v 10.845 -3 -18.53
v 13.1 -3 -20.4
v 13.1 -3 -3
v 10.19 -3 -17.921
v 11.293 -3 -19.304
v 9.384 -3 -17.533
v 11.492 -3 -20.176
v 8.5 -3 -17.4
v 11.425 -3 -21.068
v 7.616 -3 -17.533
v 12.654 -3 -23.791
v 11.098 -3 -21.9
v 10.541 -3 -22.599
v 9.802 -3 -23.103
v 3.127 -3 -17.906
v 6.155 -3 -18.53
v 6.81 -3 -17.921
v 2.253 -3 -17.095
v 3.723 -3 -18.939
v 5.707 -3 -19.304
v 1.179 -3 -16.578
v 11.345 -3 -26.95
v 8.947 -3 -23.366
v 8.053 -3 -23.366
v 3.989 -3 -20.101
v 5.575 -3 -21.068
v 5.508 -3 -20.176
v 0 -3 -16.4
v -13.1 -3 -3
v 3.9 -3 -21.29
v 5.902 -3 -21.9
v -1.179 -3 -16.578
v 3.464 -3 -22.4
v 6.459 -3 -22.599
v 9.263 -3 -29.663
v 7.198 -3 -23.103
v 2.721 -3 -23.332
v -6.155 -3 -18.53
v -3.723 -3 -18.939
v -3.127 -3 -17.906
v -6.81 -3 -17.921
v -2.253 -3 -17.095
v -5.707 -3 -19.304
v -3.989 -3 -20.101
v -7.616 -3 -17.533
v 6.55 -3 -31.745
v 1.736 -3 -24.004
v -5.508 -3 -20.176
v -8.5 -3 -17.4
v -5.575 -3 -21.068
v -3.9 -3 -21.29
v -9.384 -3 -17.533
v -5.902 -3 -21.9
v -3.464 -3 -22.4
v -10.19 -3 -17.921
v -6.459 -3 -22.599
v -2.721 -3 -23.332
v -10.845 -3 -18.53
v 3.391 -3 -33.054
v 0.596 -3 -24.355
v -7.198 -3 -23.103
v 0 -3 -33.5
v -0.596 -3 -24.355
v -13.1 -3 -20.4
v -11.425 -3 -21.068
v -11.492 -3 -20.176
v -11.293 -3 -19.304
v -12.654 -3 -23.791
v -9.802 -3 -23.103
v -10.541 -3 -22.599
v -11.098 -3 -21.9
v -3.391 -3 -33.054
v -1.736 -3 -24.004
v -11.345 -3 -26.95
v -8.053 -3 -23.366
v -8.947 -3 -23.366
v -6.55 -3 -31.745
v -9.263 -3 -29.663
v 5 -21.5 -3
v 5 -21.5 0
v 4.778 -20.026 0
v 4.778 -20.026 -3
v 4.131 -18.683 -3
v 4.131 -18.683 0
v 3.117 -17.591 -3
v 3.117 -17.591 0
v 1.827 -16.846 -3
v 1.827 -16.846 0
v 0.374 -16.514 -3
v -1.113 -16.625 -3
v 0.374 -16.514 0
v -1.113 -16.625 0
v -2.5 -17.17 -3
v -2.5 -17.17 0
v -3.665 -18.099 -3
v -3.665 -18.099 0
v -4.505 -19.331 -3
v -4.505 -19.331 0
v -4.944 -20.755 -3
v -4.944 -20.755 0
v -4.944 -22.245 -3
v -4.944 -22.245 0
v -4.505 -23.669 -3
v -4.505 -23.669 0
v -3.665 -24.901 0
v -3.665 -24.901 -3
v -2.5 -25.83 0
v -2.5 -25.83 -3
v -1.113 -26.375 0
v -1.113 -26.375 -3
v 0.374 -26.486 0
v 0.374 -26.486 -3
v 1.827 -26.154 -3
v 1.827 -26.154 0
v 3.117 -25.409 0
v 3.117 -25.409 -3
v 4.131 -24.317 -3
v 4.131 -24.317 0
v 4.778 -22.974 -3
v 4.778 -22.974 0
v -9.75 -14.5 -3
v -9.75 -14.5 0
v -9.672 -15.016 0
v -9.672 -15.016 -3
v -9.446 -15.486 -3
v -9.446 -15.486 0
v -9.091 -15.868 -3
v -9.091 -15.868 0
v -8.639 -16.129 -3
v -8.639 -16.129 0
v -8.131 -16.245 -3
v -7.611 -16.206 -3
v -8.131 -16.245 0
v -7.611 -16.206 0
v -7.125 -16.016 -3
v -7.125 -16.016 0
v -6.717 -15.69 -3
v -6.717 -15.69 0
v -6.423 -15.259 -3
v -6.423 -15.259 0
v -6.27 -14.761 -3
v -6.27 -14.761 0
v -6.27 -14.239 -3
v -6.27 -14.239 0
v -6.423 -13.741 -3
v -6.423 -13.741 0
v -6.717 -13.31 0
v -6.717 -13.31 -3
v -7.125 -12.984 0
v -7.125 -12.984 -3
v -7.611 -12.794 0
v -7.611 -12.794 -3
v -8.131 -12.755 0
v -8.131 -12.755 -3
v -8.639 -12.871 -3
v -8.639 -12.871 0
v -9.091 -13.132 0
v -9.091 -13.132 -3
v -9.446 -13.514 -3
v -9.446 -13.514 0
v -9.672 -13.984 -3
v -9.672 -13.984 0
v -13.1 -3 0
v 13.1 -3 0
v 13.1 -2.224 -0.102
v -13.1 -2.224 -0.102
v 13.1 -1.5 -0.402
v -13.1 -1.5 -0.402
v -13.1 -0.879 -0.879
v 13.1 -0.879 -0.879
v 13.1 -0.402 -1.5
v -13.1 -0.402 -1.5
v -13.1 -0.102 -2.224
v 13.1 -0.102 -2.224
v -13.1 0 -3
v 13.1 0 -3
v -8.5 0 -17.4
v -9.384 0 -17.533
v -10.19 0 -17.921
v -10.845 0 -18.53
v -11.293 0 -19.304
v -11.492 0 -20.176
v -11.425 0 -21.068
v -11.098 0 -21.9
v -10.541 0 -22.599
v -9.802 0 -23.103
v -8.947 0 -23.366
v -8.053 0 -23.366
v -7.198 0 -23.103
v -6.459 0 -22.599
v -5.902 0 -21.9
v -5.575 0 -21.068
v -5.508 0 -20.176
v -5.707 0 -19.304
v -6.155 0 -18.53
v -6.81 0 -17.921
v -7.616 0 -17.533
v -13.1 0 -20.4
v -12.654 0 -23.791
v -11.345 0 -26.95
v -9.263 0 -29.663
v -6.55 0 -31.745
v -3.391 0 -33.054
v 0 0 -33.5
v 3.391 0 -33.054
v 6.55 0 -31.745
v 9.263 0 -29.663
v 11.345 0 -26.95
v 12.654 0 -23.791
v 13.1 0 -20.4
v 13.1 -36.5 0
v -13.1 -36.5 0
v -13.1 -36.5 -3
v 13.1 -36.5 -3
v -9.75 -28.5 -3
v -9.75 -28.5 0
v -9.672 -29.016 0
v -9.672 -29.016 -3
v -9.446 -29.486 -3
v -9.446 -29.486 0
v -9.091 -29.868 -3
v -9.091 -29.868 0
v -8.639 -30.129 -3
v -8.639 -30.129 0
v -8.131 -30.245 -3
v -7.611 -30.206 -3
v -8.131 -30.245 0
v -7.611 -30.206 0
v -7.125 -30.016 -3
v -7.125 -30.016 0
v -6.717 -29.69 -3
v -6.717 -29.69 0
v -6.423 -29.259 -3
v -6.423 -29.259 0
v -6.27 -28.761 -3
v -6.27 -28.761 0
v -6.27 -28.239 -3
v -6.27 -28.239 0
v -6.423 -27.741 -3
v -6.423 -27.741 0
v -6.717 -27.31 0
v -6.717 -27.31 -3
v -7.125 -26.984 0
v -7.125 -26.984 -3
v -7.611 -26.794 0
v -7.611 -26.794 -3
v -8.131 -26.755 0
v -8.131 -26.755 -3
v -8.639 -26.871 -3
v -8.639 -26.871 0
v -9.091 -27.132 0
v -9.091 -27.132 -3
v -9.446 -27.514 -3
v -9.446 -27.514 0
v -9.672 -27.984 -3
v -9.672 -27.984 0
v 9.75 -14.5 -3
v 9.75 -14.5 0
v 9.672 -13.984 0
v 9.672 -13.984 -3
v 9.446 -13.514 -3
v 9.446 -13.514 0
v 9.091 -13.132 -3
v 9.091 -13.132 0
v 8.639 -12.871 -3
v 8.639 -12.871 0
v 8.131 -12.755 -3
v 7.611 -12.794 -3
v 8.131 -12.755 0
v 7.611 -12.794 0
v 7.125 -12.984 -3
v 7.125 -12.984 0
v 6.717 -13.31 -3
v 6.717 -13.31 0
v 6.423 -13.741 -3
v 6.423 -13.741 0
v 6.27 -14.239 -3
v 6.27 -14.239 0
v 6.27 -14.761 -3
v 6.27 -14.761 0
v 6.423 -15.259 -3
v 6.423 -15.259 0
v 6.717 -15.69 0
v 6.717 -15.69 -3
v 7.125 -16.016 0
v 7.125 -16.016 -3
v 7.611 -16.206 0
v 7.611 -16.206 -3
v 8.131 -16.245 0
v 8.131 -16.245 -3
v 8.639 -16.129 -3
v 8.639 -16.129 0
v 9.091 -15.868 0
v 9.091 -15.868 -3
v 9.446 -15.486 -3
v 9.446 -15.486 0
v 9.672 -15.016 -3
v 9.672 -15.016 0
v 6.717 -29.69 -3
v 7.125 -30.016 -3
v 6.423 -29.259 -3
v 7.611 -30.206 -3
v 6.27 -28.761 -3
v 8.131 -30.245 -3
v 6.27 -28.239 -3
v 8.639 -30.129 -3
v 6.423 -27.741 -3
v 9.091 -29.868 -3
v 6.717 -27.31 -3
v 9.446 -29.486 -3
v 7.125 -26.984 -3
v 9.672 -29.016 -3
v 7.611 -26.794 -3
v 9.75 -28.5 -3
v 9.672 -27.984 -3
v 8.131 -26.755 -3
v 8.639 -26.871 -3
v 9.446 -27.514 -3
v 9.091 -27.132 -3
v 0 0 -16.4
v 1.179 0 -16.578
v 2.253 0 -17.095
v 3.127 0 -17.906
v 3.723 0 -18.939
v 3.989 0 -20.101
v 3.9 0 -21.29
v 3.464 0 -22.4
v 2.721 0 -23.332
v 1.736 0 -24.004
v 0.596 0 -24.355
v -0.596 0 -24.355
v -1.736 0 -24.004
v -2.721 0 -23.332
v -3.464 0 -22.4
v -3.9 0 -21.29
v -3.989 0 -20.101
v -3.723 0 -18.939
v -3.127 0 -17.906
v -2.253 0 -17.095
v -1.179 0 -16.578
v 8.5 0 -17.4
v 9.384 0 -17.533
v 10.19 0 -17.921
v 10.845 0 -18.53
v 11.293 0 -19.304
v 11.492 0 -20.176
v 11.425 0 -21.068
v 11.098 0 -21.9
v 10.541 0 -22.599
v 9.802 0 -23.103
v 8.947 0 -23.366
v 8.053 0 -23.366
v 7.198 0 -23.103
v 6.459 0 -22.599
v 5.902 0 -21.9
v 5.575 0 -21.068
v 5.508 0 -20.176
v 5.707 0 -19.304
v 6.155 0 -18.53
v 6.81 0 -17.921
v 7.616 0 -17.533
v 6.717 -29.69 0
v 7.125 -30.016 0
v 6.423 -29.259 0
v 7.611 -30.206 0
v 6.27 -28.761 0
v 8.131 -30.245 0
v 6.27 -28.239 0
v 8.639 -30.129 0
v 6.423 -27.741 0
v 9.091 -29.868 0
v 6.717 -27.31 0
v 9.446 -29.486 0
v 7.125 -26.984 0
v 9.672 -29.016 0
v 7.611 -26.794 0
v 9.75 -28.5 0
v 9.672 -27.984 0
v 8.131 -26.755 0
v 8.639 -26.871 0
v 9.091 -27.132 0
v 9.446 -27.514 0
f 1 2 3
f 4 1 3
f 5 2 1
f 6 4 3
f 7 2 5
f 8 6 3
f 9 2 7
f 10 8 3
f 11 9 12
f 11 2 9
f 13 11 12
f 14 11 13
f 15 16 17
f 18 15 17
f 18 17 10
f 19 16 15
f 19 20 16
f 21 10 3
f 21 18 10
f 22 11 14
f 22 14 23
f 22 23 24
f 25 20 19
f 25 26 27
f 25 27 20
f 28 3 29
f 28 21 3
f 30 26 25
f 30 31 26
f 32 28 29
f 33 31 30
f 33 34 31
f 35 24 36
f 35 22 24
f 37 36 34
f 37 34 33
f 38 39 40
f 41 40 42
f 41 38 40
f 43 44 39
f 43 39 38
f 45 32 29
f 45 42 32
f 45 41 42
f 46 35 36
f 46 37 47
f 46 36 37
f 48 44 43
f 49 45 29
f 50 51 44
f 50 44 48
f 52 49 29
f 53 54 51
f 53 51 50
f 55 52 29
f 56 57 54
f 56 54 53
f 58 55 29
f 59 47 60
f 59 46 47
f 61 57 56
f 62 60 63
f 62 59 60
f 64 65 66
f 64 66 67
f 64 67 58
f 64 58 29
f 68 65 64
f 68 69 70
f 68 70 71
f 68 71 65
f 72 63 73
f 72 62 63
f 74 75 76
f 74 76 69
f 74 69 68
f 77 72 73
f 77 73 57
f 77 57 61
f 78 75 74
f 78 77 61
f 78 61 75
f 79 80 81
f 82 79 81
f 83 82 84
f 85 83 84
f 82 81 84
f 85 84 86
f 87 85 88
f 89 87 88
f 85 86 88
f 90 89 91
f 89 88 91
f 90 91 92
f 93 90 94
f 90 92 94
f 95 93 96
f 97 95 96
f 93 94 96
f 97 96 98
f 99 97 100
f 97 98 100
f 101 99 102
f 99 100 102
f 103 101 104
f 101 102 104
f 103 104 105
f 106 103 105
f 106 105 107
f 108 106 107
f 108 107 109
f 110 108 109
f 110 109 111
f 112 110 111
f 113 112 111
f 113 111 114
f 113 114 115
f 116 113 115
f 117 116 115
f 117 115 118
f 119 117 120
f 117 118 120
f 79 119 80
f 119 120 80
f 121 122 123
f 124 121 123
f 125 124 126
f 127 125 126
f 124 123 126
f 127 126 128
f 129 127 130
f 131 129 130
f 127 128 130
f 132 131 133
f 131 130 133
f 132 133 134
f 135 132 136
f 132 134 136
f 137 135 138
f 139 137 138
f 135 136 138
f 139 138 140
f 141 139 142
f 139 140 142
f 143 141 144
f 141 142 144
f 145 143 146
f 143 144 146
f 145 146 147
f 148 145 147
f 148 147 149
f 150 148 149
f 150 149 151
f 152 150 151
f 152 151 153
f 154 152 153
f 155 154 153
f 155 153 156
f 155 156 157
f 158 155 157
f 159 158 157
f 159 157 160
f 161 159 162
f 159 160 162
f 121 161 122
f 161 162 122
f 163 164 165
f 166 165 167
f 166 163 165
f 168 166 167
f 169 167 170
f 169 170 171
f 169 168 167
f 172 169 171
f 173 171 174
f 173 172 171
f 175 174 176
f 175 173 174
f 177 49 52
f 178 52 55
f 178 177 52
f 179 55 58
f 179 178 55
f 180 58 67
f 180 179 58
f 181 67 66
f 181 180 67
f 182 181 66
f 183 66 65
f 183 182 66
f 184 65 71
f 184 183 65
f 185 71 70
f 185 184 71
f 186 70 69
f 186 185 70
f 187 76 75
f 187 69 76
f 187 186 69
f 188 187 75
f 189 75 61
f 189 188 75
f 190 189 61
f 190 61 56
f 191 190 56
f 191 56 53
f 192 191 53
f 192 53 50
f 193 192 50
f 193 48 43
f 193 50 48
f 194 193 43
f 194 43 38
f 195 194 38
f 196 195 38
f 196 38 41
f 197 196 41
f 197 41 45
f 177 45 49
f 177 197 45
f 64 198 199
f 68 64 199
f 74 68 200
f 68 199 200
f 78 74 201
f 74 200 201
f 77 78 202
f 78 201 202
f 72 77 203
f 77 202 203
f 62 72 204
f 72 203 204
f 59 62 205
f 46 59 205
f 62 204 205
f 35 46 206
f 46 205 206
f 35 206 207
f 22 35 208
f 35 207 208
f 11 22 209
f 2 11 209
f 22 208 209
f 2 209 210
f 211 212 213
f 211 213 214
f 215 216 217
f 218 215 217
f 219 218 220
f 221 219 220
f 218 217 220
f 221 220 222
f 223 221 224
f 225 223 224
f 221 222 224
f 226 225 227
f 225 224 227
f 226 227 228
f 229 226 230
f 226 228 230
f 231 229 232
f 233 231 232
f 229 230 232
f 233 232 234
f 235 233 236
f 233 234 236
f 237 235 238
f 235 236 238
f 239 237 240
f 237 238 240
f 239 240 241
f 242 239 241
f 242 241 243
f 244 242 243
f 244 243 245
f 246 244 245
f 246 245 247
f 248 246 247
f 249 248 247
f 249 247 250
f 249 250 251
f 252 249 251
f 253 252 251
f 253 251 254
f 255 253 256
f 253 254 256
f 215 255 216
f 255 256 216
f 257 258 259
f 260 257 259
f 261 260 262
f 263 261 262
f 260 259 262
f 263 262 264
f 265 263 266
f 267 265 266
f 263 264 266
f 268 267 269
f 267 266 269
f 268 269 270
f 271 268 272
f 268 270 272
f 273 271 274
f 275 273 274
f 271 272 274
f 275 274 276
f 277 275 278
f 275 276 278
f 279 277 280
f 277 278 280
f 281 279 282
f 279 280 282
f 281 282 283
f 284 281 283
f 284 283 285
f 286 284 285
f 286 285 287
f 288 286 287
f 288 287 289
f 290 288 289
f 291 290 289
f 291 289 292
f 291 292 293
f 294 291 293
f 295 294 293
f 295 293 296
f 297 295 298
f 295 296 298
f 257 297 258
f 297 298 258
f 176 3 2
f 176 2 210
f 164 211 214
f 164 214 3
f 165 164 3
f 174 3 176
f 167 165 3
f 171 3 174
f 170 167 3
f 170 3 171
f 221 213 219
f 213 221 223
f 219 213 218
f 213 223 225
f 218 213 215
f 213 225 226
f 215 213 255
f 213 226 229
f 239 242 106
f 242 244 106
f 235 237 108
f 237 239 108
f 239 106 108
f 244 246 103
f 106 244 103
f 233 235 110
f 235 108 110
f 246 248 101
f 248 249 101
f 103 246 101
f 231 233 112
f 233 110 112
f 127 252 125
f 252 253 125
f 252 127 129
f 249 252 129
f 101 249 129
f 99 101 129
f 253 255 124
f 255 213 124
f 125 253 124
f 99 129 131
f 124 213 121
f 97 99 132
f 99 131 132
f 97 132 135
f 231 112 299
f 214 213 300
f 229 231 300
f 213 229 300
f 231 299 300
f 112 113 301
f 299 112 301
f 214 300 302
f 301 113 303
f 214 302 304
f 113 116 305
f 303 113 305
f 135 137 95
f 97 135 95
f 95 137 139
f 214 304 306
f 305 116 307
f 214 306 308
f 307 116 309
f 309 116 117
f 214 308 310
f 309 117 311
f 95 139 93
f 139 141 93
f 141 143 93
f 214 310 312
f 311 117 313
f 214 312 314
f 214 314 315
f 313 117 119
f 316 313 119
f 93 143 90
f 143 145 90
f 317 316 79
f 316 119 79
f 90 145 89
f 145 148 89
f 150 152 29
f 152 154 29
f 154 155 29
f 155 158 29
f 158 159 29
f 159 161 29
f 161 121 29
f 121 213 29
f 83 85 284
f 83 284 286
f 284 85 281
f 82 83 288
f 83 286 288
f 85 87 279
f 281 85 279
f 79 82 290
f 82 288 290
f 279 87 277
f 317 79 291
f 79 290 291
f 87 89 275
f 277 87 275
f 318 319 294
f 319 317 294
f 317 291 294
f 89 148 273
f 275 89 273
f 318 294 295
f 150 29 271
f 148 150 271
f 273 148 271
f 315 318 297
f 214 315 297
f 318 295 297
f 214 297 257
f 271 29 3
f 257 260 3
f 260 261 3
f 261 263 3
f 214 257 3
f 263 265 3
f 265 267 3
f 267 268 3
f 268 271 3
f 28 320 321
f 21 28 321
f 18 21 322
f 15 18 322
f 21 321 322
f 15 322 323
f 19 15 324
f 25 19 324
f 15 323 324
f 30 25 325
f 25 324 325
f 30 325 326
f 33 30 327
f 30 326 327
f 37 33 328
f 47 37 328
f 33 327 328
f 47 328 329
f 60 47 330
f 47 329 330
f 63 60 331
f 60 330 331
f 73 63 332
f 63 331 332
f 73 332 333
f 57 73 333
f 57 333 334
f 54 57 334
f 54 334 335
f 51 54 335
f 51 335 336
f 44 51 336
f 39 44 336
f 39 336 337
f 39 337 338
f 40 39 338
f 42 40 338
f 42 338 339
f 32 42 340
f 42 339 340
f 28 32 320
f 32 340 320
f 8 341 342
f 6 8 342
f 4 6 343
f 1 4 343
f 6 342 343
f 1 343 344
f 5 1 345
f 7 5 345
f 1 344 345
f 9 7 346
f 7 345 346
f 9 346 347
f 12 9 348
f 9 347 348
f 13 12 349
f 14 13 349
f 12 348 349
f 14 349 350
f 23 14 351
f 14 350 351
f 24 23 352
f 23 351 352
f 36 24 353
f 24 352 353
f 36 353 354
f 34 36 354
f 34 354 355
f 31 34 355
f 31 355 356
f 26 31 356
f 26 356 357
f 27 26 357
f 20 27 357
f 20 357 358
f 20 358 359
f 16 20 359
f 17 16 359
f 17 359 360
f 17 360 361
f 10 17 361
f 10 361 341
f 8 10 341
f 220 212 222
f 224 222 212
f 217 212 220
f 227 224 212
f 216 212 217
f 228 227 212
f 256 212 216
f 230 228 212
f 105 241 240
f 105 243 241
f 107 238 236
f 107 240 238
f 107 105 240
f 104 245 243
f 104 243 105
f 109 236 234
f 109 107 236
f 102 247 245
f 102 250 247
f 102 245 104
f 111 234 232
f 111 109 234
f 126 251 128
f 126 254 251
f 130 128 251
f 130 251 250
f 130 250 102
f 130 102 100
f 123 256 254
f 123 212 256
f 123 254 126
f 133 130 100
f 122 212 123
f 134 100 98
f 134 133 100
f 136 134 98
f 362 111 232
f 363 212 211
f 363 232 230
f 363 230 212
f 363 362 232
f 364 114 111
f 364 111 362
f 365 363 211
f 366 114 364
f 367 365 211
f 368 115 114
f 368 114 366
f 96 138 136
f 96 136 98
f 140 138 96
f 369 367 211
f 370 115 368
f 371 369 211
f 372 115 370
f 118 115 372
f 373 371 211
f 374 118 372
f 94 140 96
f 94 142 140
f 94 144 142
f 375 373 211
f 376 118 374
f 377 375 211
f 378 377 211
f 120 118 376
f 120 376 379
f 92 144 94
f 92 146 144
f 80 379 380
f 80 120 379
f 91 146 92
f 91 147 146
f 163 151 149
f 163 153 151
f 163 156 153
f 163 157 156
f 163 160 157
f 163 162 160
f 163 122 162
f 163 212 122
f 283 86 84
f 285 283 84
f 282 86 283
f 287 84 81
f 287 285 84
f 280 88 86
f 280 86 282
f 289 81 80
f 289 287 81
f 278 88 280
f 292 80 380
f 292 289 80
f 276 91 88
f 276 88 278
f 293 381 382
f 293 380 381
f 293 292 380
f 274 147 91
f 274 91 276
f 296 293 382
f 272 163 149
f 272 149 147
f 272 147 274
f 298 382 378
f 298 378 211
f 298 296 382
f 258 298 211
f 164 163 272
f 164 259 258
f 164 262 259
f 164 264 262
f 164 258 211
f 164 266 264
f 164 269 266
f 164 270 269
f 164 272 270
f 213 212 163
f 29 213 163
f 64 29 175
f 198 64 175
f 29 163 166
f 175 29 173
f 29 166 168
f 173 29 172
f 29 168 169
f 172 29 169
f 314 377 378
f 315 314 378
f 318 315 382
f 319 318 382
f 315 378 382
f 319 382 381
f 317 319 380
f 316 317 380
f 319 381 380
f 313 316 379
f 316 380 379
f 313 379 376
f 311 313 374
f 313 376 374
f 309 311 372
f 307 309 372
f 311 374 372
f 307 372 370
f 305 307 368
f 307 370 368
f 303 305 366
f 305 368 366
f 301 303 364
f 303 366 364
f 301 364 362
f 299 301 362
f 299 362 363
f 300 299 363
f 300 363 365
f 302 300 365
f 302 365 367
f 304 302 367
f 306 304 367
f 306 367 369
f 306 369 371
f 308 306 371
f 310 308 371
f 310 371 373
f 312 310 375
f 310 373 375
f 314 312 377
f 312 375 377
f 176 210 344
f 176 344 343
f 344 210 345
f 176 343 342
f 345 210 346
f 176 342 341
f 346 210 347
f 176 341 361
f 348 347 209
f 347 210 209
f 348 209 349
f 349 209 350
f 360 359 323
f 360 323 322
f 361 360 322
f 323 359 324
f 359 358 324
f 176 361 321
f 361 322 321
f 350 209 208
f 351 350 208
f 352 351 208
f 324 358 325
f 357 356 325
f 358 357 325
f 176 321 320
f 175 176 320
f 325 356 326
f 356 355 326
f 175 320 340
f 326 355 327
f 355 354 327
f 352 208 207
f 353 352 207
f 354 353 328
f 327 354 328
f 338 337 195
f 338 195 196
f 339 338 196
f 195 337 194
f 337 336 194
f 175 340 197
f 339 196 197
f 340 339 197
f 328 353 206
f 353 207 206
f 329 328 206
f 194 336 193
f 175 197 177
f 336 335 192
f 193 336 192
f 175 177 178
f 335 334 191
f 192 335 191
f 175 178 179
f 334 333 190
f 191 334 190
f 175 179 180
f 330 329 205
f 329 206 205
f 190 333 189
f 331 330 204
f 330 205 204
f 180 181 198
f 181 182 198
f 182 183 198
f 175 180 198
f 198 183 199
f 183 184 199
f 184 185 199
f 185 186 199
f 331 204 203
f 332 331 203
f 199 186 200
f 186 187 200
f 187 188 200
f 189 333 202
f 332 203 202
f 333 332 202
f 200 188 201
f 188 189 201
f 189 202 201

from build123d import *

# Parameters (mm, degrees)
SKETCH_3_R          = 4
EXTRUDE_1_DEPTH     = 3
SKETCH_4_W          = 26.2
SKETCH_4_H          = 33.5
SKETCH_4_R          = 5
SKETCH_4_R_2        = 1.75
EXTRUDE_2_DEPTH     = 3
FILLET_1_R          = 3
SKETCH_7_R          = 3
CUT_EXTRUDE_1_DEPTH = 52.245585176


with BuildPart() as part:
    # 草图3 → 凸台-拉伸1 (new body)
    with BuildSketch(Plane(origin=(0, 0, 0), x_dir=(1, 0, 0), z_dir=(0, 1, 0))):
        with BuildLine():
            Line((0, 0), (-13.1, 0))
            Line((-13.1, 0), (-13.1, 20.4))
            ThreePointArc((-13.1, 20.4), (0, 33.5), (13.1, 20.4))
            Line((13.1, 20.4), (13.1, 0))
            Line((13.1, 0), (0, 0))
        make_face()
        with Locations(Location((0, 20.4, 0), (0, 0, 270))):
            Circle(SKETCH_3_R, mode=Mode.SUBTRACT)
    extrude(amount=-EXTRUDE_1_DEPTH)

    # 草图4 → 凸台-拉伸2 (add)
    with BuildSketch(Plane.XY):
        with Locations((0, -19.75)):
            Rectangle(SKETCH_4_W, SKETCH_4_H)
        with Locations((0, -21.5)):
            Circle(SKETCH_4_R, mode=Mode.SUBTRACT)
        with Locations((8, -28.5)):
            Circle(SKETCH_4_R_2, mode=Mode.SUBTRACT)
        with Locations((8, -14.5)):
            Circle(SKETCH_4_R_2, mode=Mode.SUBTRACT)
        with Locations(Location((-8, -14.5, 0), (0, 0, 180))):
            Circle(SKETCH_4_R_2, mode=Mode.SUBTRACT)
        with Locations(Location((-8, -28.5, 0), (0, 0, 180))):
            Circle(SKETCH_4_R_2, mode=Mode.SUBTRACT)
    extrude(amount=-EXTRUDE_2_DEPTH)

    # 圆角1
    fillet_1_edges = [part.edges().sort_by_distance(p)[0] for p in [
        (0, 0, 0),
    ]]
    fillet(fillet_1_edges, radius=FILLET_1_R)

    # 草图7 → 切除-拉伸1 (cut, through all)
    with BuildSketch(Plane(origin=(0, 0, 0), x_dir=(1, 0, 0), z_dir=(0, 1, 0))):
        with Locations(Location((8.5, 20.4, 0), (0, 0, 270))):
            Circle(SKETCH_7_R)
    cut_extrude_1 = extrude(amount=-CUT_EXTRUDE_1_DEPTH, mode=Mode.SUBTRACT)

    # 镜向1: 切除-拉伸1 across plane
    add(cut_extrude_1.mirror(Plane(origin=(0, 0, 0), x_dir=(0, 0, 1), z_dir=(1, 0, 0))), mode=Mode.SUBTRACT)


solid = part.part
